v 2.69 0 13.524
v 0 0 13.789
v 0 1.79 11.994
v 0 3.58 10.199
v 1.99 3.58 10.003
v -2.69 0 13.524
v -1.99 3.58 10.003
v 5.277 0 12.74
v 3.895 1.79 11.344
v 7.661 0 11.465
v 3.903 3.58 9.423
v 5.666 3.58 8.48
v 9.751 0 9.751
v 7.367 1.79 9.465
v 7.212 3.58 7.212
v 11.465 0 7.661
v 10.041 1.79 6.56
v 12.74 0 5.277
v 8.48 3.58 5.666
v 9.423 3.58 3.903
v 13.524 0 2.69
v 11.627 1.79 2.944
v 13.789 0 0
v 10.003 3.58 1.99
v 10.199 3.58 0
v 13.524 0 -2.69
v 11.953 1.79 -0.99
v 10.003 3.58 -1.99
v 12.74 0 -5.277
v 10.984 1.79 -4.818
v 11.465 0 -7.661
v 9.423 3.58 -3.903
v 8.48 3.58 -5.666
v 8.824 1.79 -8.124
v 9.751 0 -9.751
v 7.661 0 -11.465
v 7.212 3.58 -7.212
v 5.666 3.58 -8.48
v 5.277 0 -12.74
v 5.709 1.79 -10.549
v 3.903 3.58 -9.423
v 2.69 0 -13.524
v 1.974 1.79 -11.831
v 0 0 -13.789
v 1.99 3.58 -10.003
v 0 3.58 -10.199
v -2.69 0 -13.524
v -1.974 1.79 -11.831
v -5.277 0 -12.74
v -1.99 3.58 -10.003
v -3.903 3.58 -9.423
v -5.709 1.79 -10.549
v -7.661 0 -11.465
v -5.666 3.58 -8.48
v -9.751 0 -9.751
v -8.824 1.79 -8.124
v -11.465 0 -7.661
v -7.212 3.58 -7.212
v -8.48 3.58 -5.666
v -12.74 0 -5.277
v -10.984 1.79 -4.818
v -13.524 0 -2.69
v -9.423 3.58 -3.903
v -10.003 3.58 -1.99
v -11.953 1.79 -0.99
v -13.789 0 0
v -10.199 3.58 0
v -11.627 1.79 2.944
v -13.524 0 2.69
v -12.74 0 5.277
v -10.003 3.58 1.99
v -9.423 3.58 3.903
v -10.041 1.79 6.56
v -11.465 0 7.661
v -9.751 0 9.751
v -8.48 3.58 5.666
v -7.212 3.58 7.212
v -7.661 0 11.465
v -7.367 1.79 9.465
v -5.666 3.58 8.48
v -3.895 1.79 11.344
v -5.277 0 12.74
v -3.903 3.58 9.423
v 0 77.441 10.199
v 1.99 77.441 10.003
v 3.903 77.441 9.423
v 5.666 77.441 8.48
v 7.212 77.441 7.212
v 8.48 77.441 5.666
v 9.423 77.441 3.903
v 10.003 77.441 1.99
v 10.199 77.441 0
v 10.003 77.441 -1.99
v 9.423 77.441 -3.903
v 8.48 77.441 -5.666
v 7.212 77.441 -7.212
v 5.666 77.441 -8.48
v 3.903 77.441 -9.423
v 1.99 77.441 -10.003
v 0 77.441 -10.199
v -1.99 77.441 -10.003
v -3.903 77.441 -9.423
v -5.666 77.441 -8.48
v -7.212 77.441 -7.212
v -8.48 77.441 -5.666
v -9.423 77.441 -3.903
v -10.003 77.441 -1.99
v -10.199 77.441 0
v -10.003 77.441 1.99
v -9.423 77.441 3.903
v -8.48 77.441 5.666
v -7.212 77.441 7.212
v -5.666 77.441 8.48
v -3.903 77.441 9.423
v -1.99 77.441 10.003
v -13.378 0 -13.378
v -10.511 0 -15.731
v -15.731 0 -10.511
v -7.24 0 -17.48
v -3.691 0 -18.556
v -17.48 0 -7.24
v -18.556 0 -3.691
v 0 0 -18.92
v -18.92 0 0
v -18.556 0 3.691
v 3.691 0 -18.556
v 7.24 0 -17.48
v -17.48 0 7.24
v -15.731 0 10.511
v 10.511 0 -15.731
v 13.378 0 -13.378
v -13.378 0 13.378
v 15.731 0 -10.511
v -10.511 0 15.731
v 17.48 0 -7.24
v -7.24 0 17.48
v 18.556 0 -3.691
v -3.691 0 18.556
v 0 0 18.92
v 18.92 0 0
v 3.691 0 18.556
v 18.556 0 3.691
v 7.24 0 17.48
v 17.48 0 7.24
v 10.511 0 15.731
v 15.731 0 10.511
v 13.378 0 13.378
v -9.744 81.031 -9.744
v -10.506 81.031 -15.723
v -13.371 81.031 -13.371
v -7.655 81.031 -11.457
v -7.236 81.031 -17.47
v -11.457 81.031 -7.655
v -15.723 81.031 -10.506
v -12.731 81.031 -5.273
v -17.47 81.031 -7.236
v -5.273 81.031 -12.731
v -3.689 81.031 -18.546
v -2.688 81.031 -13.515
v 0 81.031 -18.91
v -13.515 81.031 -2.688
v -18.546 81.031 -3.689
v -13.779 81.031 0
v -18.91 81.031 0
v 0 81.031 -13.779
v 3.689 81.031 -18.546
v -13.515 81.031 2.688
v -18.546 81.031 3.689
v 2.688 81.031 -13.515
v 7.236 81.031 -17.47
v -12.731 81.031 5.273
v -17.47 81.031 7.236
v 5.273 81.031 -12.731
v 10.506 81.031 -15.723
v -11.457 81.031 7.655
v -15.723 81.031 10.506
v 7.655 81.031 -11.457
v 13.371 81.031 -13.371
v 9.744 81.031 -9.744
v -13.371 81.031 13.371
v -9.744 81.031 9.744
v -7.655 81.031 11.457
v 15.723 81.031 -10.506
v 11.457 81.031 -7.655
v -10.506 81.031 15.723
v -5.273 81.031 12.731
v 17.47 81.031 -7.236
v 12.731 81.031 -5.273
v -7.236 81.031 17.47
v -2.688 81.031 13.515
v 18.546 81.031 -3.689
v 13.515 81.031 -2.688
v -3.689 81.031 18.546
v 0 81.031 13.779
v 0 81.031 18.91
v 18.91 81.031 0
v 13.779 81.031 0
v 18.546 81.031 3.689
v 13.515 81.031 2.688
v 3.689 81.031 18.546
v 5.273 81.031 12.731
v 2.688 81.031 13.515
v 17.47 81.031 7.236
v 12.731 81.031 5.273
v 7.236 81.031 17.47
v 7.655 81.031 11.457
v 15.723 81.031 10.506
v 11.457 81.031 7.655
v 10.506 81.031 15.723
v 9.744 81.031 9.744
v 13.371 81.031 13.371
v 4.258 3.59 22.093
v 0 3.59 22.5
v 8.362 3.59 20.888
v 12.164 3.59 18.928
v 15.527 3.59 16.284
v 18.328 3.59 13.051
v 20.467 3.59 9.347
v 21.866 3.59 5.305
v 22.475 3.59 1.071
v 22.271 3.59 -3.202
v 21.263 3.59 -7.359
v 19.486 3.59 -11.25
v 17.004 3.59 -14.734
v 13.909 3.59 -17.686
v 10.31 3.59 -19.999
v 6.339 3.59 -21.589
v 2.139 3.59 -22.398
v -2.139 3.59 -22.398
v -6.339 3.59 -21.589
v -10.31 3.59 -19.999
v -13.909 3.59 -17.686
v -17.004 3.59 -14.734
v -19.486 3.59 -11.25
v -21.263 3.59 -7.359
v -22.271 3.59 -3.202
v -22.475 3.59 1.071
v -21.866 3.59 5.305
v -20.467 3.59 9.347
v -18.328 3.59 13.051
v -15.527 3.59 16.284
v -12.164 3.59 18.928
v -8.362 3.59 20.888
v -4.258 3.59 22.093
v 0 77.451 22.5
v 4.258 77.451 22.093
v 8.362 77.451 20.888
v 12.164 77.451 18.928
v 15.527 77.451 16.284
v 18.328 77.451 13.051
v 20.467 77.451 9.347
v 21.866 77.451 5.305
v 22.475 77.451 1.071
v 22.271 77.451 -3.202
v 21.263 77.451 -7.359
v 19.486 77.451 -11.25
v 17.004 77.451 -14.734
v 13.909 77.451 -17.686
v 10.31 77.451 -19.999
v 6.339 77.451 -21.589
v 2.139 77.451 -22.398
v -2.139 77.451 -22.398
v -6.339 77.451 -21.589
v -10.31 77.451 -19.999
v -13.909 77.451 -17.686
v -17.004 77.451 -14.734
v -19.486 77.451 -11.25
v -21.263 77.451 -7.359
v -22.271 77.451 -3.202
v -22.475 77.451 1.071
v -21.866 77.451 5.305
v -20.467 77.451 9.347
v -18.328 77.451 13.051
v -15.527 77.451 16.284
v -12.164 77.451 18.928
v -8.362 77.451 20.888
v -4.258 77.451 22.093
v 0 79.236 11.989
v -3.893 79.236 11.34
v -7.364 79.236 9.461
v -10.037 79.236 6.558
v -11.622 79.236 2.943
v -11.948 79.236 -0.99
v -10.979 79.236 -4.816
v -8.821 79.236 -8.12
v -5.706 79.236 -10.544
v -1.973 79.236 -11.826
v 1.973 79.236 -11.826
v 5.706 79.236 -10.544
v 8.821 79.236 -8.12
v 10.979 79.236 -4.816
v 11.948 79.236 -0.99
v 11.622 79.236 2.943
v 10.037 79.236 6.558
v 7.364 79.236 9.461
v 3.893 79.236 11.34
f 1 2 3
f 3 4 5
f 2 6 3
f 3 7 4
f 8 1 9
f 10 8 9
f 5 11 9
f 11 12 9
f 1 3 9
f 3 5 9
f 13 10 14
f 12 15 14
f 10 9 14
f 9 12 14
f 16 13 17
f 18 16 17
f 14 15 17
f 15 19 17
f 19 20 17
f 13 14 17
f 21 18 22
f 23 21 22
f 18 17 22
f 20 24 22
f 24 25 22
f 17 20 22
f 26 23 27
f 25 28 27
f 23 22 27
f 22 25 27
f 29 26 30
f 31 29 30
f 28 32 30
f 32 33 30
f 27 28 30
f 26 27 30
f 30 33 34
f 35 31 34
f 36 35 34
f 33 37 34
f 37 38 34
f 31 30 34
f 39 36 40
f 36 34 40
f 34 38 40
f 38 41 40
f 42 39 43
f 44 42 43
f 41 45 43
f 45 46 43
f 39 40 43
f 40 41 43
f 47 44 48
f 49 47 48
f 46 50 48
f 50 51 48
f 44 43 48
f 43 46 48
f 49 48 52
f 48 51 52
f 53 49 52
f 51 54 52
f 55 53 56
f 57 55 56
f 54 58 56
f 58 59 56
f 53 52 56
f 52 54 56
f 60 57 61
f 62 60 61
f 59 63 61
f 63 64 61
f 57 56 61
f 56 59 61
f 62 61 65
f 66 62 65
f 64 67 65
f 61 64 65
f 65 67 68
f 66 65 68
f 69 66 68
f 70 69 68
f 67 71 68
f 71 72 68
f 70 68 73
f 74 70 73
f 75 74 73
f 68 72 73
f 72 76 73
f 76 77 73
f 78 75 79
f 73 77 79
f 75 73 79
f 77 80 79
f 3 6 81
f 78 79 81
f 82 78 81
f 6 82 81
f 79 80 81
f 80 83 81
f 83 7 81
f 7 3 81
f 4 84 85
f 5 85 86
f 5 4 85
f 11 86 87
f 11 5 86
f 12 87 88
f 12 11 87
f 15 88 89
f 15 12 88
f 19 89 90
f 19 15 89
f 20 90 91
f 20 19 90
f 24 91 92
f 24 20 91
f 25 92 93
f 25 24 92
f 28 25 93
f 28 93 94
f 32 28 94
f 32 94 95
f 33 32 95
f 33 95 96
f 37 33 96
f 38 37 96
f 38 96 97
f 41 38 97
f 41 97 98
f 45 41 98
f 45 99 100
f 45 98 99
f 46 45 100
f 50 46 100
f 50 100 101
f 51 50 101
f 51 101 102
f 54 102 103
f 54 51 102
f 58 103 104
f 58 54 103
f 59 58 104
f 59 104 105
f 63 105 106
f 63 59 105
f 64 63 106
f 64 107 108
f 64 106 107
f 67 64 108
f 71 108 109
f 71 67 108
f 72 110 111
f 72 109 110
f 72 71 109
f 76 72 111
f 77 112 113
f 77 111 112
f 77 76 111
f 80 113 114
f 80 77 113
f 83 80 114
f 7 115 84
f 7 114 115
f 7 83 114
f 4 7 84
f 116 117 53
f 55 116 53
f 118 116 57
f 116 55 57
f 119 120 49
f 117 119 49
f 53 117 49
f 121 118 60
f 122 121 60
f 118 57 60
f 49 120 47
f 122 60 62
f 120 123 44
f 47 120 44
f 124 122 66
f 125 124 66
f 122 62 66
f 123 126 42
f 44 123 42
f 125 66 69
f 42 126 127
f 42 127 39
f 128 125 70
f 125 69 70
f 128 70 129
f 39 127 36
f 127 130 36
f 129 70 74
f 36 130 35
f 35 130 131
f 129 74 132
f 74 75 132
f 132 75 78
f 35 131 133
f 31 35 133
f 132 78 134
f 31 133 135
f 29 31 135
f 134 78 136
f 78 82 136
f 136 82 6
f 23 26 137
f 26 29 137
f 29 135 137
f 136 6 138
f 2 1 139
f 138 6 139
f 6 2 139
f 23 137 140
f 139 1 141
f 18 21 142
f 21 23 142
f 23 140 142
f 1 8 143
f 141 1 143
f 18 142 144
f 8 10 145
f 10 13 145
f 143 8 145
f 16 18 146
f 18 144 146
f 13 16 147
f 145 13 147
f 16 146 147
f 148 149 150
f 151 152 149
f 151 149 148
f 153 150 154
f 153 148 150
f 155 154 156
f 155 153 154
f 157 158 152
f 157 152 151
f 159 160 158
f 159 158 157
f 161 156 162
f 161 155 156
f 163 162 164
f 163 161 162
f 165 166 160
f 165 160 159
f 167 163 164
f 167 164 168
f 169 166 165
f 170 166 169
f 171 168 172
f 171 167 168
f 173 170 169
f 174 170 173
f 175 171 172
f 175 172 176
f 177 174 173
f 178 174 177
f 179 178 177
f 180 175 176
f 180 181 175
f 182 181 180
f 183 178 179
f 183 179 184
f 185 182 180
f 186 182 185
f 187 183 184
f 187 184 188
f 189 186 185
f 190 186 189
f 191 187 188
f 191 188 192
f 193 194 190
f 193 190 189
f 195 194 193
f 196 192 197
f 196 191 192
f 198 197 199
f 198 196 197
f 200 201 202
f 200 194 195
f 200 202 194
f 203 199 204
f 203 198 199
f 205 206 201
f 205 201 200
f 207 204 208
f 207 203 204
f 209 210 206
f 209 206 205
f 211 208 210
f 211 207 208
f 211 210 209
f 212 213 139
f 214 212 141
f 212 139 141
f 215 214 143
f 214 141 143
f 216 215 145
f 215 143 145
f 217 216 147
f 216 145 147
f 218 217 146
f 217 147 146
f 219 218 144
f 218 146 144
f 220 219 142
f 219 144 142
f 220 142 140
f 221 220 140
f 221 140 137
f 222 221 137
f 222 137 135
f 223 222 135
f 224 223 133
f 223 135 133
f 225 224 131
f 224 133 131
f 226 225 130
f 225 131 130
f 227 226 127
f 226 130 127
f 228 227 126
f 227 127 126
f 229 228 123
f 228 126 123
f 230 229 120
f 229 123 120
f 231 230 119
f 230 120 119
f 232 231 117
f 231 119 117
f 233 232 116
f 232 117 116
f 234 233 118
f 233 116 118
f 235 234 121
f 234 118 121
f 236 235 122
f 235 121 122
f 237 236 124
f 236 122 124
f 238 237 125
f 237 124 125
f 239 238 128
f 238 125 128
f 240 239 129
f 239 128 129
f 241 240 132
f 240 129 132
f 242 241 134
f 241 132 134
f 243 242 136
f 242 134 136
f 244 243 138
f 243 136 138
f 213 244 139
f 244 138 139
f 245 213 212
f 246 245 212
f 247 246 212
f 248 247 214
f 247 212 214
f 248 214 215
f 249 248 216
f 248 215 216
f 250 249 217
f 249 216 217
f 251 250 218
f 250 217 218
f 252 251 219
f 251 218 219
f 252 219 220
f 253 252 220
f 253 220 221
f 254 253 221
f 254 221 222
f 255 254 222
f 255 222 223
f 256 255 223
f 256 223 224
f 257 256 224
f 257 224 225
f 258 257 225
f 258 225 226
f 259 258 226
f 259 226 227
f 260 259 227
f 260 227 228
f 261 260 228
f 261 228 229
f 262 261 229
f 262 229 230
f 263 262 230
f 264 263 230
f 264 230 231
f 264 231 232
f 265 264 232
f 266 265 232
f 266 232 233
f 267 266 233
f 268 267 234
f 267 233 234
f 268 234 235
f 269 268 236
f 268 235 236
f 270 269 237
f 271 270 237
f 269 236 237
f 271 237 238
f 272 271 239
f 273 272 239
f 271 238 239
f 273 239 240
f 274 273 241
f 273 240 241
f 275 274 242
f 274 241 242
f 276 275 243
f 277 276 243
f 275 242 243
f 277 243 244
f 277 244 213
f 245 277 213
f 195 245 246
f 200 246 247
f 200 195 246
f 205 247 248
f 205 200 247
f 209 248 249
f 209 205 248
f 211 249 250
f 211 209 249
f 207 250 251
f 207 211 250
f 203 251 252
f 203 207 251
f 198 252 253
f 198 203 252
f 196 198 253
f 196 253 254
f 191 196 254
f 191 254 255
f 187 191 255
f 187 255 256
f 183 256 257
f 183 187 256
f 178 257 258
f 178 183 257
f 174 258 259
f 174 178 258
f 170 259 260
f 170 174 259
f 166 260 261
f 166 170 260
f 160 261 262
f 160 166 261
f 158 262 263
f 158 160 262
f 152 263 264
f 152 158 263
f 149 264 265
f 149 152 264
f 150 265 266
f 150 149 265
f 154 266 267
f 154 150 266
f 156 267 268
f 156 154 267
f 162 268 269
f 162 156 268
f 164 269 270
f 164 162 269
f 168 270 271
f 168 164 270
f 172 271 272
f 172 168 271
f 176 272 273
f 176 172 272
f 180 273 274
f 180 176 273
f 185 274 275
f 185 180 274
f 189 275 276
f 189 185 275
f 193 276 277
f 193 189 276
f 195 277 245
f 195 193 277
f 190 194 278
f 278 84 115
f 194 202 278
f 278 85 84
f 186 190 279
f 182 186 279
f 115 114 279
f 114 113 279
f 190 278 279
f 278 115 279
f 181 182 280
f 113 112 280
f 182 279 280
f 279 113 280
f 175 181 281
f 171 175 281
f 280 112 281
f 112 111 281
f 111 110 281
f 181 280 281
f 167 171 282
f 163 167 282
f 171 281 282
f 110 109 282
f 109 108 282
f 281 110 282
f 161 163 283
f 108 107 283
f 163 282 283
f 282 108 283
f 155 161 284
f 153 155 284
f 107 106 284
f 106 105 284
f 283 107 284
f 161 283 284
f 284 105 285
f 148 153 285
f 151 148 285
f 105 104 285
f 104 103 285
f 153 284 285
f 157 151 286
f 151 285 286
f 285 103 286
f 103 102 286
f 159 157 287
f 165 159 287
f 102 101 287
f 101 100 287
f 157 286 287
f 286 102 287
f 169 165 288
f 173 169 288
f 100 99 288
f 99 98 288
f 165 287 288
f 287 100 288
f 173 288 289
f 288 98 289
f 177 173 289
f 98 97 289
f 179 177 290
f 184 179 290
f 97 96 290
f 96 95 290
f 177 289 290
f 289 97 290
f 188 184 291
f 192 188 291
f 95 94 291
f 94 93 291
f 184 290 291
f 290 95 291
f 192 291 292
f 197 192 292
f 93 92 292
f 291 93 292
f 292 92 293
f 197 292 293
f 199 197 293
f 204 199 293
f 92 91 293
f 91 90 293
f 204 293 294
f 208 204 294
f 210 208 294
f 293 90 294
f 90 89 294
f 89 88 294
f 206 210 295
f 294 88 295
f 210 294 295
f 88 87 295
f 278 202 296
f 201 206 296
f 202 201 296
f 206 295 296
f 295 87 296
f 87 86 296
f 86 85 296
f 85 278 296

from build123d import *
from OCP.BRepFilletAPI import BRepFilletAPI_MakeChamfer

# Parameters (mm, degrees)
SKETCH1_R           = 22.5
BOSS_EXTRUDE1_DEPTH = 81.030915537
SKETCH2_R           = 10.199174828
CUT_EXTRUDE1_DEPTH  = 88.054633839
CHAMFER1_SIZE       = 3.580234487
CHAMFER1_SIZE2      = 3.590256796


with BuildPart() as part:
    # Sketch1 → Boss-Extrude1 (new body)
    with BuildSketch(Plane(origin=(0, 0, 0), x_dir=(1, 0, 0), z_dir=(0, 1, 0))):
        Circle(SKETCH1_R)
    extrude(amount=BOSS_EXTRUDE1_DEPTH)

    # Sketch2 → Cut-Extrude1 (cut, through all)
    with BuildSketch(Plane(origin=(0, 0, 0), x_dir=(1, 0, 0), z_dir=(0, 1, 0))):
        Circle(SKETCH2_R)
    extrude(amount=CUT_EXTRUDE1_DEPTH, mode=Mode.SUBTRACT)

    # Chamfer1: one chamfer whose edges measure the first distance from different faces: ONE call of the kernel's chamfer builder (chamfer() names one face for all edges)
    chamfer1_edges_1 = [part.edges().sort_by_distance(p)[0] for p in [
        (-10.199174828, 81.030915537, 0),
    ]]
    chamfer1_side_1 = [part.faces().sort_by_distance(p)[0] for p in [
        (-21.863603897, 81.030915537, 0),
    ]]
    chamfer1_edges_2 = [part.edges().sort_by_distance(p)[0] for p in [
        (-10.199174828, 0, 0),
    ]]
    chamfer1_side_2 = [part.faces().sort_by_distance(p)[0] for p in [
        (-10.199174828, 40.515457769, 0),
    ]]
    chamfer1_edges_3 = [part.edges().sort_by_distance(p)[0] for p in [
        (-22.5, 0, 0),
    ]]
    chamfer1_side_3 = [part.faces().sort_by_distance(p)[0] for p in [
        (-21.863603897, 0, 0),
    ]]
    chamfer1_edges_4 = [part.edges().sort_by_distance(p)[0] for p in [
        (-22.5, 81.030915537, 0),
    ]]
    chamfer1_side_4 = [part.faces().sort_by_distance(p)[0] for p in [
        (-22.5, 40.515457769, 0),
    ]]
    chamfer1 = BRepFilletAPI_MakeChamfer(part.part.solid().wrapped)
    for e in chamfer1_edges_1:
        chamfer1.Add(CHAMFER1_SIZE, CHAMFER1_SIZE2, e.wrapped, chamfer1_side_1[0].wrapped)  # the first distance lies on this face
    for e in chamfer1_edges_2:
        chamfer1.Add(CHAMFER1_SIZE, CHAMFER1_SIZE2, e.wrapped, chamfer1_side_2[0].wrapped)  # the first distance lies on this face
    for e in chamfer1_edges_3:
        chamfer1.Add(CHAMFER1_SIZE, CHAMFER1_SIZE2, e.wrapped, chamfer1_side_3[0].wrapped)  # the first distance lies on this face
    for e in chamfer1_edges_4:
        chamfer1.Add(CHAMFER1_SIZE, CHAMFER1_SIZE2, e.wrapped, chamfer1_side_4[0].wrapped)  # the first distance lies on this face
    add(Compound.cast(chamfer1.Shape()), mode=Mode.REPLACE)


solid = part.part
